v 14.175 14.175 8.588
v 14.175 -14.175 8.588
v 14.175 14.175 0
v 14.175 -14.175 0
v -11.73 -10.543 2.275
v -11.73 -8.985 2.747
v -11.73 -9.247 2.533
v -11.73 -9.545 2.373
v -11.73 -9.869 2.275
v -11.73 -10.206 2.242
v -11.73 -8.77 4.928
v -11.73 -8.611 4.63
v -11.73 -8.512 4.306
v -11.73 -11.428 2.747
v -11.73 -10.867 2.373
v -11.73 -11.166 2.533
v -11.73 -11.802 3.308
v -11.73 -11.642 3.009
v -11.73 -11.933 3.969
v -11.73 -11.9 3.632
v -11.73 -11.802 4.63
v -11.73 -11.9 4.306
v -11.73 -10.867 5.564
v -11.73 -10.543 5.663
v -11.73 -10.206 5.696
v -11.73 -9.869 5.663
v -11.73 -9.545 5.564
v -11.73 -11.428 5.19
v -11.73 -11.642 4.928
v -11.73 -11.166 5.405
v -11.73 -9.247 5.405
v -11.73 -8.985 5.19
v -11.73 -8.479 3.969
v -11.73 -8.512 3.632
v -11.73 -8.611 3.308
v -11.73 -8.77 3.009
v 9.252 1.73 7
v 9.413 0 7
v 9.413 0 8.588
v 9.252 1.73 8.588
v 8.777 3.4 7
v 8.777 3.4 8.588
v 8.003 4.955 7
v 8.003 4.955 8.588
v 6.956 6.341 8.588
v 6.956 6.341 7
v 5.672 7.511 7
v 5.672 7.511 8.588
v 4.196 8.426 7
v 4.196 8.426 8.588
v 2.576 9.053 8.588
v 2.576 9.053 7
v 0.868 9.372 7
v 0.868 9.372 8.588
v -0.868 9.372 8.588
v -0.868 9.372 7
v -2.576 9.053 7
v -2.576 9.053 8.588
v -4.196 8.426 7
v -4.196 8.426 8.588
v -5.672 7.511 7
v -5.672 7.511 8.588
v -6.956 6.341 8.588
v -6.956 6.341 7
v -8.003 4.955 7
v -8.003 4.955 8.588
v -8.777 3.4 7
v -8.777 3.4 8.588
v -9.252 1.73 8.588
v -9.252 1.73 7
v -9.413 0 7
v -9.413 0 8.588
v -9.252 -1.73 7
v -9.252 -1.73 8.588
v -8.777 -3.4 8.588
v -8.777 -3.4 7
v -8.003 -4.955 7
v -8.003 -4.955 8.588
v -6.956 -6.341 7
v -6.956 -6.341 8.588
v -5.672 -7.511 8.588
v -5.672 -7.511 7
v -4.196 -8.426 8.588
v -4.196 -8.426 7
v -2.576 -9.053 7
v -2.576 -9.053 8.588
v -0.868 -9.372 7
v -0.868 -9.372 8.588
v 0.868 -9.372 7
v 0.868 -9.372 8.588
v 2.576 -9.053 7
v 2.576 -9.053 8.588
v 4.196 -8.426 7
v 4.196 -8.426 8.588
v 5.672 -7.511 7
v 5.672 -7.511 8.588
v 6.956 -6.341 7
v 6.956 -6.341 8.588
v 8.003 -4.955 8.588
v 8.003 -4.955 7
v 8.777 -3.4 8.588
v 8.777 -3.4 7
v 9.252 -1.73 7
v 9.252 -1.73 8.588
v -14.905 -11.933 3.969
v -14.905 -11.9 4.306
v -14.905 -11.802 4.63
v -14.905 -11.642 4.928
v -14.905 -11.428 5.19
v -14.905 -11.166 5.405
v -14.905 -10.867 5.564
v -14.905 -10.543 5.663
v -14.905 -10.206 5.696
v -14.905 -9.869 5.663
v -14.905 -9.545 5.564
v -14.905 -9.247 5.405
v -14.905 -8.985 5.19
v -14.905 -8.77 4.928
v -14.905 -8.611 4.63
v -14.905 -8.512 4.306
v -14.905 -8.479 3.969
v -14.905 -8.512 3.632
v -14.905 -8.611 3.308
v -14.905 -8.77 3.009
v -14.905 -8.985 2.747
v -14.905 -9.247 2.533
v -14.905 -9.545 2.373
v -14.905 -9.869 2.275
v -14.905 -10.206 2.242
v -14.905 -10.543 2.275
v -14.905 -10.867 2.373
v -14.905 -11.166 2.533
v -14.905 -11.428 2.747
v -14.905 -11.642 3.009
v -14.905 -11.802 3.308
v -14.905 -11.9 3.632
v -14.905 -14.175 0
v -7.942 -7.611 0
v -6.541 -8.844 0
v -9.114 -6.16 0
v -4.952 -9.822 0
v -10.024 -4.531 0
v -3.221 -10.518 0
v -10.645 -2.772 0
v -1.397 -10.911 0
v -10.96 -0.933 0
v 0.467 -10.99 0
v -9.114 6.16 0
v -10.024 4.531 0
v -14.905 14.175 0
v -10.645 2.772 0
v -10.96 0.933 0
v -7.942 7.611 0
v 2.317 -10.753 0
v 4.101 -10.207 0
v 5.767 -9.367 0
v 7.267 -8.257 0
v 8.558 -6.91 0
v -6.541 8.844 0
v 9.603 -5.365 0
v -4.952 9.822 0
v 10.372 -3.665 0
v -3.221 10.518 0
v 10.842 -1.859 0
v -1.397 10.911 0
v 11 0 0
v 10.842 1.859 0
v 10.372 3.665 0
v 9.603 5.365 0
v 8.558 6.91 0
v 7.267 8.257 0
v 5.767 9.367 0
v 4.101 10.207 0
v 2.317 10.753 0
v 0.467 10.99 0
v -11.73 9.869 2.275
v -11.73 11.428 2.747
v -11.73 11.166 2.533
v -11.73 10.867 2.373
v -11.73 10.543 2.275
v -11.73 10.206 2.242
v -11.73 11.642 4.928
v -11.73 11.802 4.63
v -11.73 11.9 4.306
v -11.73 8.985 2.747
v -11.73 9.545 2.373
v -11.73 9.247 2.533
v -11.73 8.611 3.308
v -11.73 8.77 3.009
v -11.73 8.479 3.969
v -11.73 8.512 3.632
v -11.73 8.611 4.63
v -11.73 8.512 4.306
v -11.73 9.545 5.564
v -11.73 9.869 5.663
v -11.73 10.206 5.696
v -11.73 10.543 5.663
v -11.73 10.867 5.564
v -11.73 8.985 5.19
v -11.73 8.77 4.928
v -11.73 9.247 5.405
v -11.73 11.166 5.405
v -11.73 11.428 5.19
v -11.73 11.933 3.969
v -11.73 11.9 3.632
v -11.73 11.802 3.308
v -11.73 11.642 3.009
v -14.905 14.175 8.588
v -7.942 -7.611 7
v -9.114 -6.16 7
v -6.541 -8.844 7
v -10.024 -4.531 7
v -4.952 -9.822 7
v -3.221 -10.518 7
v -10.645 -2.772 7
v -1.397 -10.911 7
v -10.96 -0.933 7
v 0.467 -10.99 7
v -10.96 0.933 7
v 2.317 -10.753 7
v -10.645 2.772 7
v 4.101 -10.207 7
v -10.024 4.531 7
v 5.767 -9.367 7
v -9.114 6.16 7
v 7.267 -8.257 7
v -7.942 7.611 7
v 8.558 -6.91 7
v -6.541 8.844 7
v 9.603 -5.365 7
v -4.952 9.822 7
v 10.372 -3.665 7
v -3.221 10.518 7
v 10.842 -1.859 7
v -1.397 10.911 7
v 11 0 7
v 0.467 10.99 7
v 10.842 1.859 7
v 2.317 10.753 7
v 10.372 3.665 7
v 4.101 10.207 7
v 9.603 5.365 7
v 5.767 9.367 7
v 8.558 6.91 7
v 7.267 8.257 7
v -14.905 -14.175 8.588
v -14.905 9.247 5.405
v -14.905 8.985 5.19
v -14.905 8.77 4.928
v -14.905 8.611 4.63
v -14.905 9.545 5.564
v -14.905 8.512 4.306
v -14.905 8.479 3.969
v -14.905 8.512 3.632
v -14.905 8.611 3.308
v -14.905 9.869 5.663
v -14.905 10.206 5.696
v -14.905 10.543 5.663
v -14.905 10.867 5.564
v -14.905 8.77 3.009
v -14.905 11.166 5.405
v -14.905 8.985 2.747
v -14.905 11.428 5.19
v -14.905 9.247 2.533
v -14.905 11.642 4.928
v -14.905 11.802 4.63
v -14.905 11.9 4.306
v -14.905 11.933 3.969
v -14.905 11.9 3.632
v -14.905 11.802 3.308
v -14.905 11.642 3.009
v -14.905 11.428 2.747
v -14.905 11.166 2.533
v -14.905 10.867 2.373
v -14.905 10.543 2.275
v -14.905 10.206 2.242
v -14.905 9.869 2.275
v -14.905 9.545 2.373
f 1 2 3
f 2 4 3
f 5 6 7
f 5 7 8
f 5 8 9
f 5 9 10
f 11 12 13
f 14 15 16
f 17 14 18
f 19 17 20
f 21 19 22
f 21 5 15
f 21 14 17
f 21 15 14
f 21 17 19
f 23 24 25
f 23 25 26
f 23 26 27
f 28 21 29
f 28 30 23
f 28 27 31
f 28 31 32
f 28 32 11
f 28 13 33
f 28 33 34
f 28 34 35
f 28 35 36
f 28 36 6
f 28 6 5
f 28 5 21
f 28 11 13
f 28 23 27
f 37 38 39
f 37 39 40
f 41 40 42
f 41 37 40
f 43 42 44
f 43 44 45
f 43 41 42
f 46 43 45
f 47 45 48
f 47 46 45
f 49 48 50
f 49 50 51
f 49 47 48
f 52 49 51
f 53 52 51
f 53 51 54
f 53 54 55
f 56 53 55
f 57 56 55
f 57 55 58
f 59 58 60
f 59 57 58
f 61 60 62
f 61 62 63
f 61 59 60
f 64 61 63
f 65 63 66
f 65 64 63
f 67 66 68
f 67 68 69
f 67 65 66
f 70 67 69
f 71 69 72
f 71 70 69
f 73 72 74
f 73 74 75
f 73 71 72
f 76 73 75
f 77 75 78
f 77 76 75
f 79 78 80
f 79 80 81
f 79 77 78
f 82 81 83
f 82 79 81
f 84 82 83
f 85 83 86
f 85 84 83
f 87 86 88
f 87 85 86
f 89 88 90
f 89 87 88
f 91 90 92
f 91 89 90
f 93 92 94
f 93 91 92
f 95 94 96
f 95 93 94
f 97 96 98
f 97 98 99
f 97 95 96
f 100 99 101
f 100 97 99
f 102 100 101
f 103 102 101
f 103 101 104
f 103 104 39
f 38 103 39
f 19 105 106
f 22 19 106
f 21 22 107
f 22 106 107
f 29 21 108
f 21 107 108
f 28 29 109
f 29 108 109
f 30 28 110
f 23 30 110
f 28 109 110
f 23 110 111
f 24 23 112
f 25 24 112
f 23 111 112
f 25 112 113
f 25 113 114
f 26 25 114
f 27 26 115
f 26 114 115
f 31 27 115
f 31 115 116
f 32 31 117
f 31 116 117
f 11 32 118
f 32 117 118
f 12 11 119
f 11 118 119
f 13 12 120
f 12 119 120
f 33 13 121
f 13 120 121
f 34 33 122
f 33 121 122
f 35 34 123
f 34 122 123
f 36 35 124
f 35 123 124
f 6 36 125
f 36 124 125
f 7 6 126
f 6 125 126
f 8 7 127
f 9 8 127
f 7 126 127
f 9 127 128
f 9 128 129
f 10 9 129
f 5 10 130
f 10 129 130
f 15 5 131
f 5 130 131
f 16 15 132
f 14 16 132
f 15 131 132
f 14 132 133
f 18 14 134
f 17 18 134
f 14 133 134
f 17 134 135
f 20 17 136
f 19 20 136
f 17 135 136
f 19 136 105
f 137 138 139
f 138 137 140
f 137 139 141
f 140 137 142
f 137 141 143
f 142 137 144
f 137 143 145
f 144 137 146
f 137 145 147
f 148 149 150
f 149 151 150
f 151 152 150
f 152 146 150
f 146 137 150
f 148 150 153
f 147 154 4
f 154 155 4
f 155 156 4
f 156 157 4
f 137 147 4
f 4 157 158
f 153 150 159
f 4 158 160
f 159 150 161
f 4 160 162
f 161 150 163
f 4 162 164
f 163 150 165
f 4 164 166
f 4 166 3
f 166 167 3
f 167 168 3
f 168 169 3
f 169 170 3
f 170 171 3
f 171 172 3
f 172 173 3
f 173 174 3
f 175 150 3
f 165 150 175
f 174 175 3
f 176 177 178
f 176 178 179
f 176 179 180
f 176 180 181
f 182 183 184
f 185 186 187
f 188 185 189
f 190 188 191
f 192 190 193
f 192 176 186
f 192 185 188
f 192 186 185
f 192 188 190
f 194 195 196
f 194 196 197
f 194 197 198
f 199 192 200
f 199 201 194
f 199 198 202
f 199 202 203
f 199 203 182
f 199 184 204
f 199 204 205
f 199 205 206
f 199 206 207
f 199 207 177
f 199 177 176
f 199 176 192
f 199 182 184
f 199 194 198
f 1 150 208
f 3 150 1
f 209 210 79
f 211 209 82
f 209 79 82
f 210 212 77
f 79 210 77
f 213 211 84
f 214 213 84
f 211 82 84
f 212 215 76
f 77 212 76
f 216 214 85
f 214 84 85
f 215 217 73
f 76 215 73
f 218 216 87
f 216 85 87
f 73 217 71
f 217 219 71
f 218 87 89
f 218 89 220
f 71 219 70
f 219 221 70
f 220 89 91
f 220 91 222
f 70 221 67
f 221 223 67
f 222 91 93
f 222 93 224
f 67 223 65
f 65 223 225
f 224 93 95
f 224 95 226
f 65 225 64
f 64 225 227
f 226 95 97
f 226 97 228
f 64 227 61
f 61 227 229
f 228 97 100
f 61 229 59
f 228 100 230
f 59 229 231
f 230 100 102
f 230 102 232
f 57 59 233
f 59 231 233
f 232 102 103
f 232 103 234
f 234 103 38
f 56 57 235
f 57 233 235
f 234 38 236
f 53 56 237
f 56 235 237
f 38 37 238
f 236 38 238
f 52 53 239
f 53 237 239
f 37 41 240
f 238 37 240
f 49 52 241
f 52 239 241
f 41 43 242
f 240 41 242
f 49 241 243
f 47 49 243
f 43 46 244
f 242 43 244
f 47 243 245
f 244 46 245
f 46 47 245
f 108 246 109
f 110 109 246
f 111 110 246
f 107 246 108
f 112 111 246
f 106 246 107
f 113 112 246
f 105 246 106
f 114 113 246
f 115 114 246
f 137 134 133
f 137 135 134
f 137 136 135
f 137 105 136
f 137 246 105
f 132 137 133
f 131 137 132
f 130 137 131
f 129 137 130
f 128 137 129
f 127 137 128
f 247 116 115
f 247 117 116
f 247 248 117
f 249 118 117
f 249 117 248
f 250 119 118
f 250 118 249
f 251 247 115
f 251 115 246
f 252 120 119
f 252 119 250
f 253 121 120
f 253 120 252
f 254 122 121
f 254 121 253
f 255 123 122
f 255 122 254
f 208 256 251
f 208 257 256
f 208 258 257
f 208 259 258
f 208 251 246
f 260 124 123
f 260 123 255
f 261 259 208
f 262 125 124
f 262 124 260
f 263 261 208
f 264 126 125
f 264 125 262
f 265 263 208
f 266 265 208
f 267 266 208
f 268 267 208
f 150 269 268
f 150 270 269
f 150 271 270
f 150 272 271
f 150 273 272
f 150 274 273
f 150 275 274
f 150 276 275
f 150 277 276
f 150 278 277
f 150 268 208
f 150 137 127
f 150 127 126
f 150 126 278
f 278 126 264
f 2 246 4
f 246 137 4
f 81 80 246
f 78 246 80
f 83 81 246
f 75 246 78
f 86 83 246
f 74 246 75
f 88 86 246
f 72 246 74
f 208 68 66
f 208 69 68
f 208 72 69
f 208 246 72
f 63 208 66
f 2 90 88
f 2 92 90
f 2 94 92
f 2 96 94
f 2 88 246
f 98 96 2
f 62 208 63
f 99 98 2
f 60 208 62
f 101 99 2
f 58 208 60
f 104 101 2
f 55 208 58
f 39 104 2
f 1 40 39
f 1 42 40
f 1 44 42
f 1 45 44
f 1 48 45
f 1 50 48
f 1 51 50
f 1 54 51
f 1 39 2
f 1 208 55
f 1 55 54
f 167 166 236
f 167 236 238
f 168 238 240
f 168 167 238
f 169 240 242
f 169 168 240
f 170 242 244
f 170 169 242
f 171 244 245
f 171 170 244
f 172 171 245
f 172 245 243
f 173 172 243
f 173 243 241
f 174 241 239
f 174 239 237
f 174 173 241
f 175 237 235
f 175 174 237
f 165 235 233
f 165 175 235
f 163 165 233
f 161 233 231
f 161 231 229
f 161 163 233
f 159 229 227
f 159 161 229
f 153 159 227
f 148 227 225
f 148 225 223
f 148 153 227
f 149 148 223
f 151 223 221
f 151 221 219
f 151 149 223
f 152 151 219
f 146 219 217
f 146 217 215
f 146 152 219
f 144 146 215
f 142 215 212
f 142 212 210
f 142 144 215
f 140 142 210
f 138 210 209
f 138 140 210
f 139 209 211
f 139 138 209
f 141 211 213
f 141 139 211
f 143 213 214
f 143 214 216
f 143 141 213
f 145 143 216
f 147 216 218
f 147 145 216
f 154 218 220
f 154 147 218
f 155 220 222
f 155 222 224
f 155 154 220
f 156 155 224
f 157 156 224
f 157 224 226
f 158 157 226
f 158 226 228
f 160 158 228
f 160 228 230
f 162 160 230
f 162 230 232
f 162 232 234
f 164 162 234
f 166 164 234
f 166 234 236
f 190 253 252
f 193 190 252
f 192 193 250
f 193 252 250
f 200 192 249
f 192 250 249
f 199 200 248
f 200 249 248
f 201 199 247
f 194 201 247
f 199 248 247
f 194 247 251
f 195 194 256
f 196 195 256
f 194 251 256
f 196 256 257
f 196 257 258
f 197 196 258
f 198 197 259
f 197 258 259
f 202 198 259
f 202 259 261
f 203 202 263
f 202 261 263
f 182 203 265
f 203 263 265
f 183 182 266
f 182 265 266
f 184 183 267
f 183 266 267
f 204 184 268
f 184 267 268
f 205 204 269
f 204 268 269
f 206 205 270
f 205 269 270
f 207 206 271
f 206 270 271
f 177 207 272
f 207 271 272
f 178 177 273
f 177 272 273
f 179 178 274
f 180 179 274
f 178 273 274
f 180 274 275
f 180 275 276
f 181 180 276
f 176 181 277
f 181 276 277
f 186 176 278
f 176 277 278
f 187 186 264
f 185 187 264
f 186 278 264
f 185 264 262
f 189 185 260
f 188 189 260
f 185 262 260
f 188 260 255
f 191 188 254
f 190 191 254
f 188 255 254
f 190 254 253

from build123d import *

# Parameters (mm, degrees)
F0_R     = 11
F1_DEPTH = 7
F2_W     = 29.0801070888
F2_H     = 28.3500068
F2_R     = 11
F2_R_2   = 9.4125034
F3_DEPTH = 1.5875
F4_R     = 1.7272
F5_DEPTH = 3.175


with BuildPart() as f1:
    # F0 (on Top) → F1 (new body)
    with BuildSketch(Plane.XY):
        Polygon((14.1750034, 14.1750034), (0, 14.1750034), (-14.9051036888, 14.1750034), (-14.9051036888, -14.1750034), (0, -14.1750034), (14.1750034, -14.1750034), align=None)
        Circle(F0_R, mode=Mode.SUBTRACT)
    extrude(amount=F1_DEPTH)

    # F2 (on face) → F3 (join)
    with BuildSketch(Plane.XY.offset(7)):
        with Locations((-0.3650501444, 0)):
            Rectangle(F2_W, F2_H)
        Circle(F2_R, mode=Mode.SUBTRACT)
        Circle(F2_R)
        Circle(F2_R_2, mode=Mode.SUBTRACT)
    extrude(amount=F3_DEPTH)

    # F4 (on face) → F5 (cut)
    with BuildSketch(Plane(origin=(-14.9051036888, 0, 0), x_dir=(0, -1, 0), z_dir=(-1, 0, 0))):
        with Locations((10.2062534, 3.96875)):
            Circle(F4_R)
        with Locations((-10.2062534, 3.96875)):
            Circle(F4_R)
    extrude(amount=-F5_DEPTH, mode=Mode.SUBTRACT)


solid = f1.part
